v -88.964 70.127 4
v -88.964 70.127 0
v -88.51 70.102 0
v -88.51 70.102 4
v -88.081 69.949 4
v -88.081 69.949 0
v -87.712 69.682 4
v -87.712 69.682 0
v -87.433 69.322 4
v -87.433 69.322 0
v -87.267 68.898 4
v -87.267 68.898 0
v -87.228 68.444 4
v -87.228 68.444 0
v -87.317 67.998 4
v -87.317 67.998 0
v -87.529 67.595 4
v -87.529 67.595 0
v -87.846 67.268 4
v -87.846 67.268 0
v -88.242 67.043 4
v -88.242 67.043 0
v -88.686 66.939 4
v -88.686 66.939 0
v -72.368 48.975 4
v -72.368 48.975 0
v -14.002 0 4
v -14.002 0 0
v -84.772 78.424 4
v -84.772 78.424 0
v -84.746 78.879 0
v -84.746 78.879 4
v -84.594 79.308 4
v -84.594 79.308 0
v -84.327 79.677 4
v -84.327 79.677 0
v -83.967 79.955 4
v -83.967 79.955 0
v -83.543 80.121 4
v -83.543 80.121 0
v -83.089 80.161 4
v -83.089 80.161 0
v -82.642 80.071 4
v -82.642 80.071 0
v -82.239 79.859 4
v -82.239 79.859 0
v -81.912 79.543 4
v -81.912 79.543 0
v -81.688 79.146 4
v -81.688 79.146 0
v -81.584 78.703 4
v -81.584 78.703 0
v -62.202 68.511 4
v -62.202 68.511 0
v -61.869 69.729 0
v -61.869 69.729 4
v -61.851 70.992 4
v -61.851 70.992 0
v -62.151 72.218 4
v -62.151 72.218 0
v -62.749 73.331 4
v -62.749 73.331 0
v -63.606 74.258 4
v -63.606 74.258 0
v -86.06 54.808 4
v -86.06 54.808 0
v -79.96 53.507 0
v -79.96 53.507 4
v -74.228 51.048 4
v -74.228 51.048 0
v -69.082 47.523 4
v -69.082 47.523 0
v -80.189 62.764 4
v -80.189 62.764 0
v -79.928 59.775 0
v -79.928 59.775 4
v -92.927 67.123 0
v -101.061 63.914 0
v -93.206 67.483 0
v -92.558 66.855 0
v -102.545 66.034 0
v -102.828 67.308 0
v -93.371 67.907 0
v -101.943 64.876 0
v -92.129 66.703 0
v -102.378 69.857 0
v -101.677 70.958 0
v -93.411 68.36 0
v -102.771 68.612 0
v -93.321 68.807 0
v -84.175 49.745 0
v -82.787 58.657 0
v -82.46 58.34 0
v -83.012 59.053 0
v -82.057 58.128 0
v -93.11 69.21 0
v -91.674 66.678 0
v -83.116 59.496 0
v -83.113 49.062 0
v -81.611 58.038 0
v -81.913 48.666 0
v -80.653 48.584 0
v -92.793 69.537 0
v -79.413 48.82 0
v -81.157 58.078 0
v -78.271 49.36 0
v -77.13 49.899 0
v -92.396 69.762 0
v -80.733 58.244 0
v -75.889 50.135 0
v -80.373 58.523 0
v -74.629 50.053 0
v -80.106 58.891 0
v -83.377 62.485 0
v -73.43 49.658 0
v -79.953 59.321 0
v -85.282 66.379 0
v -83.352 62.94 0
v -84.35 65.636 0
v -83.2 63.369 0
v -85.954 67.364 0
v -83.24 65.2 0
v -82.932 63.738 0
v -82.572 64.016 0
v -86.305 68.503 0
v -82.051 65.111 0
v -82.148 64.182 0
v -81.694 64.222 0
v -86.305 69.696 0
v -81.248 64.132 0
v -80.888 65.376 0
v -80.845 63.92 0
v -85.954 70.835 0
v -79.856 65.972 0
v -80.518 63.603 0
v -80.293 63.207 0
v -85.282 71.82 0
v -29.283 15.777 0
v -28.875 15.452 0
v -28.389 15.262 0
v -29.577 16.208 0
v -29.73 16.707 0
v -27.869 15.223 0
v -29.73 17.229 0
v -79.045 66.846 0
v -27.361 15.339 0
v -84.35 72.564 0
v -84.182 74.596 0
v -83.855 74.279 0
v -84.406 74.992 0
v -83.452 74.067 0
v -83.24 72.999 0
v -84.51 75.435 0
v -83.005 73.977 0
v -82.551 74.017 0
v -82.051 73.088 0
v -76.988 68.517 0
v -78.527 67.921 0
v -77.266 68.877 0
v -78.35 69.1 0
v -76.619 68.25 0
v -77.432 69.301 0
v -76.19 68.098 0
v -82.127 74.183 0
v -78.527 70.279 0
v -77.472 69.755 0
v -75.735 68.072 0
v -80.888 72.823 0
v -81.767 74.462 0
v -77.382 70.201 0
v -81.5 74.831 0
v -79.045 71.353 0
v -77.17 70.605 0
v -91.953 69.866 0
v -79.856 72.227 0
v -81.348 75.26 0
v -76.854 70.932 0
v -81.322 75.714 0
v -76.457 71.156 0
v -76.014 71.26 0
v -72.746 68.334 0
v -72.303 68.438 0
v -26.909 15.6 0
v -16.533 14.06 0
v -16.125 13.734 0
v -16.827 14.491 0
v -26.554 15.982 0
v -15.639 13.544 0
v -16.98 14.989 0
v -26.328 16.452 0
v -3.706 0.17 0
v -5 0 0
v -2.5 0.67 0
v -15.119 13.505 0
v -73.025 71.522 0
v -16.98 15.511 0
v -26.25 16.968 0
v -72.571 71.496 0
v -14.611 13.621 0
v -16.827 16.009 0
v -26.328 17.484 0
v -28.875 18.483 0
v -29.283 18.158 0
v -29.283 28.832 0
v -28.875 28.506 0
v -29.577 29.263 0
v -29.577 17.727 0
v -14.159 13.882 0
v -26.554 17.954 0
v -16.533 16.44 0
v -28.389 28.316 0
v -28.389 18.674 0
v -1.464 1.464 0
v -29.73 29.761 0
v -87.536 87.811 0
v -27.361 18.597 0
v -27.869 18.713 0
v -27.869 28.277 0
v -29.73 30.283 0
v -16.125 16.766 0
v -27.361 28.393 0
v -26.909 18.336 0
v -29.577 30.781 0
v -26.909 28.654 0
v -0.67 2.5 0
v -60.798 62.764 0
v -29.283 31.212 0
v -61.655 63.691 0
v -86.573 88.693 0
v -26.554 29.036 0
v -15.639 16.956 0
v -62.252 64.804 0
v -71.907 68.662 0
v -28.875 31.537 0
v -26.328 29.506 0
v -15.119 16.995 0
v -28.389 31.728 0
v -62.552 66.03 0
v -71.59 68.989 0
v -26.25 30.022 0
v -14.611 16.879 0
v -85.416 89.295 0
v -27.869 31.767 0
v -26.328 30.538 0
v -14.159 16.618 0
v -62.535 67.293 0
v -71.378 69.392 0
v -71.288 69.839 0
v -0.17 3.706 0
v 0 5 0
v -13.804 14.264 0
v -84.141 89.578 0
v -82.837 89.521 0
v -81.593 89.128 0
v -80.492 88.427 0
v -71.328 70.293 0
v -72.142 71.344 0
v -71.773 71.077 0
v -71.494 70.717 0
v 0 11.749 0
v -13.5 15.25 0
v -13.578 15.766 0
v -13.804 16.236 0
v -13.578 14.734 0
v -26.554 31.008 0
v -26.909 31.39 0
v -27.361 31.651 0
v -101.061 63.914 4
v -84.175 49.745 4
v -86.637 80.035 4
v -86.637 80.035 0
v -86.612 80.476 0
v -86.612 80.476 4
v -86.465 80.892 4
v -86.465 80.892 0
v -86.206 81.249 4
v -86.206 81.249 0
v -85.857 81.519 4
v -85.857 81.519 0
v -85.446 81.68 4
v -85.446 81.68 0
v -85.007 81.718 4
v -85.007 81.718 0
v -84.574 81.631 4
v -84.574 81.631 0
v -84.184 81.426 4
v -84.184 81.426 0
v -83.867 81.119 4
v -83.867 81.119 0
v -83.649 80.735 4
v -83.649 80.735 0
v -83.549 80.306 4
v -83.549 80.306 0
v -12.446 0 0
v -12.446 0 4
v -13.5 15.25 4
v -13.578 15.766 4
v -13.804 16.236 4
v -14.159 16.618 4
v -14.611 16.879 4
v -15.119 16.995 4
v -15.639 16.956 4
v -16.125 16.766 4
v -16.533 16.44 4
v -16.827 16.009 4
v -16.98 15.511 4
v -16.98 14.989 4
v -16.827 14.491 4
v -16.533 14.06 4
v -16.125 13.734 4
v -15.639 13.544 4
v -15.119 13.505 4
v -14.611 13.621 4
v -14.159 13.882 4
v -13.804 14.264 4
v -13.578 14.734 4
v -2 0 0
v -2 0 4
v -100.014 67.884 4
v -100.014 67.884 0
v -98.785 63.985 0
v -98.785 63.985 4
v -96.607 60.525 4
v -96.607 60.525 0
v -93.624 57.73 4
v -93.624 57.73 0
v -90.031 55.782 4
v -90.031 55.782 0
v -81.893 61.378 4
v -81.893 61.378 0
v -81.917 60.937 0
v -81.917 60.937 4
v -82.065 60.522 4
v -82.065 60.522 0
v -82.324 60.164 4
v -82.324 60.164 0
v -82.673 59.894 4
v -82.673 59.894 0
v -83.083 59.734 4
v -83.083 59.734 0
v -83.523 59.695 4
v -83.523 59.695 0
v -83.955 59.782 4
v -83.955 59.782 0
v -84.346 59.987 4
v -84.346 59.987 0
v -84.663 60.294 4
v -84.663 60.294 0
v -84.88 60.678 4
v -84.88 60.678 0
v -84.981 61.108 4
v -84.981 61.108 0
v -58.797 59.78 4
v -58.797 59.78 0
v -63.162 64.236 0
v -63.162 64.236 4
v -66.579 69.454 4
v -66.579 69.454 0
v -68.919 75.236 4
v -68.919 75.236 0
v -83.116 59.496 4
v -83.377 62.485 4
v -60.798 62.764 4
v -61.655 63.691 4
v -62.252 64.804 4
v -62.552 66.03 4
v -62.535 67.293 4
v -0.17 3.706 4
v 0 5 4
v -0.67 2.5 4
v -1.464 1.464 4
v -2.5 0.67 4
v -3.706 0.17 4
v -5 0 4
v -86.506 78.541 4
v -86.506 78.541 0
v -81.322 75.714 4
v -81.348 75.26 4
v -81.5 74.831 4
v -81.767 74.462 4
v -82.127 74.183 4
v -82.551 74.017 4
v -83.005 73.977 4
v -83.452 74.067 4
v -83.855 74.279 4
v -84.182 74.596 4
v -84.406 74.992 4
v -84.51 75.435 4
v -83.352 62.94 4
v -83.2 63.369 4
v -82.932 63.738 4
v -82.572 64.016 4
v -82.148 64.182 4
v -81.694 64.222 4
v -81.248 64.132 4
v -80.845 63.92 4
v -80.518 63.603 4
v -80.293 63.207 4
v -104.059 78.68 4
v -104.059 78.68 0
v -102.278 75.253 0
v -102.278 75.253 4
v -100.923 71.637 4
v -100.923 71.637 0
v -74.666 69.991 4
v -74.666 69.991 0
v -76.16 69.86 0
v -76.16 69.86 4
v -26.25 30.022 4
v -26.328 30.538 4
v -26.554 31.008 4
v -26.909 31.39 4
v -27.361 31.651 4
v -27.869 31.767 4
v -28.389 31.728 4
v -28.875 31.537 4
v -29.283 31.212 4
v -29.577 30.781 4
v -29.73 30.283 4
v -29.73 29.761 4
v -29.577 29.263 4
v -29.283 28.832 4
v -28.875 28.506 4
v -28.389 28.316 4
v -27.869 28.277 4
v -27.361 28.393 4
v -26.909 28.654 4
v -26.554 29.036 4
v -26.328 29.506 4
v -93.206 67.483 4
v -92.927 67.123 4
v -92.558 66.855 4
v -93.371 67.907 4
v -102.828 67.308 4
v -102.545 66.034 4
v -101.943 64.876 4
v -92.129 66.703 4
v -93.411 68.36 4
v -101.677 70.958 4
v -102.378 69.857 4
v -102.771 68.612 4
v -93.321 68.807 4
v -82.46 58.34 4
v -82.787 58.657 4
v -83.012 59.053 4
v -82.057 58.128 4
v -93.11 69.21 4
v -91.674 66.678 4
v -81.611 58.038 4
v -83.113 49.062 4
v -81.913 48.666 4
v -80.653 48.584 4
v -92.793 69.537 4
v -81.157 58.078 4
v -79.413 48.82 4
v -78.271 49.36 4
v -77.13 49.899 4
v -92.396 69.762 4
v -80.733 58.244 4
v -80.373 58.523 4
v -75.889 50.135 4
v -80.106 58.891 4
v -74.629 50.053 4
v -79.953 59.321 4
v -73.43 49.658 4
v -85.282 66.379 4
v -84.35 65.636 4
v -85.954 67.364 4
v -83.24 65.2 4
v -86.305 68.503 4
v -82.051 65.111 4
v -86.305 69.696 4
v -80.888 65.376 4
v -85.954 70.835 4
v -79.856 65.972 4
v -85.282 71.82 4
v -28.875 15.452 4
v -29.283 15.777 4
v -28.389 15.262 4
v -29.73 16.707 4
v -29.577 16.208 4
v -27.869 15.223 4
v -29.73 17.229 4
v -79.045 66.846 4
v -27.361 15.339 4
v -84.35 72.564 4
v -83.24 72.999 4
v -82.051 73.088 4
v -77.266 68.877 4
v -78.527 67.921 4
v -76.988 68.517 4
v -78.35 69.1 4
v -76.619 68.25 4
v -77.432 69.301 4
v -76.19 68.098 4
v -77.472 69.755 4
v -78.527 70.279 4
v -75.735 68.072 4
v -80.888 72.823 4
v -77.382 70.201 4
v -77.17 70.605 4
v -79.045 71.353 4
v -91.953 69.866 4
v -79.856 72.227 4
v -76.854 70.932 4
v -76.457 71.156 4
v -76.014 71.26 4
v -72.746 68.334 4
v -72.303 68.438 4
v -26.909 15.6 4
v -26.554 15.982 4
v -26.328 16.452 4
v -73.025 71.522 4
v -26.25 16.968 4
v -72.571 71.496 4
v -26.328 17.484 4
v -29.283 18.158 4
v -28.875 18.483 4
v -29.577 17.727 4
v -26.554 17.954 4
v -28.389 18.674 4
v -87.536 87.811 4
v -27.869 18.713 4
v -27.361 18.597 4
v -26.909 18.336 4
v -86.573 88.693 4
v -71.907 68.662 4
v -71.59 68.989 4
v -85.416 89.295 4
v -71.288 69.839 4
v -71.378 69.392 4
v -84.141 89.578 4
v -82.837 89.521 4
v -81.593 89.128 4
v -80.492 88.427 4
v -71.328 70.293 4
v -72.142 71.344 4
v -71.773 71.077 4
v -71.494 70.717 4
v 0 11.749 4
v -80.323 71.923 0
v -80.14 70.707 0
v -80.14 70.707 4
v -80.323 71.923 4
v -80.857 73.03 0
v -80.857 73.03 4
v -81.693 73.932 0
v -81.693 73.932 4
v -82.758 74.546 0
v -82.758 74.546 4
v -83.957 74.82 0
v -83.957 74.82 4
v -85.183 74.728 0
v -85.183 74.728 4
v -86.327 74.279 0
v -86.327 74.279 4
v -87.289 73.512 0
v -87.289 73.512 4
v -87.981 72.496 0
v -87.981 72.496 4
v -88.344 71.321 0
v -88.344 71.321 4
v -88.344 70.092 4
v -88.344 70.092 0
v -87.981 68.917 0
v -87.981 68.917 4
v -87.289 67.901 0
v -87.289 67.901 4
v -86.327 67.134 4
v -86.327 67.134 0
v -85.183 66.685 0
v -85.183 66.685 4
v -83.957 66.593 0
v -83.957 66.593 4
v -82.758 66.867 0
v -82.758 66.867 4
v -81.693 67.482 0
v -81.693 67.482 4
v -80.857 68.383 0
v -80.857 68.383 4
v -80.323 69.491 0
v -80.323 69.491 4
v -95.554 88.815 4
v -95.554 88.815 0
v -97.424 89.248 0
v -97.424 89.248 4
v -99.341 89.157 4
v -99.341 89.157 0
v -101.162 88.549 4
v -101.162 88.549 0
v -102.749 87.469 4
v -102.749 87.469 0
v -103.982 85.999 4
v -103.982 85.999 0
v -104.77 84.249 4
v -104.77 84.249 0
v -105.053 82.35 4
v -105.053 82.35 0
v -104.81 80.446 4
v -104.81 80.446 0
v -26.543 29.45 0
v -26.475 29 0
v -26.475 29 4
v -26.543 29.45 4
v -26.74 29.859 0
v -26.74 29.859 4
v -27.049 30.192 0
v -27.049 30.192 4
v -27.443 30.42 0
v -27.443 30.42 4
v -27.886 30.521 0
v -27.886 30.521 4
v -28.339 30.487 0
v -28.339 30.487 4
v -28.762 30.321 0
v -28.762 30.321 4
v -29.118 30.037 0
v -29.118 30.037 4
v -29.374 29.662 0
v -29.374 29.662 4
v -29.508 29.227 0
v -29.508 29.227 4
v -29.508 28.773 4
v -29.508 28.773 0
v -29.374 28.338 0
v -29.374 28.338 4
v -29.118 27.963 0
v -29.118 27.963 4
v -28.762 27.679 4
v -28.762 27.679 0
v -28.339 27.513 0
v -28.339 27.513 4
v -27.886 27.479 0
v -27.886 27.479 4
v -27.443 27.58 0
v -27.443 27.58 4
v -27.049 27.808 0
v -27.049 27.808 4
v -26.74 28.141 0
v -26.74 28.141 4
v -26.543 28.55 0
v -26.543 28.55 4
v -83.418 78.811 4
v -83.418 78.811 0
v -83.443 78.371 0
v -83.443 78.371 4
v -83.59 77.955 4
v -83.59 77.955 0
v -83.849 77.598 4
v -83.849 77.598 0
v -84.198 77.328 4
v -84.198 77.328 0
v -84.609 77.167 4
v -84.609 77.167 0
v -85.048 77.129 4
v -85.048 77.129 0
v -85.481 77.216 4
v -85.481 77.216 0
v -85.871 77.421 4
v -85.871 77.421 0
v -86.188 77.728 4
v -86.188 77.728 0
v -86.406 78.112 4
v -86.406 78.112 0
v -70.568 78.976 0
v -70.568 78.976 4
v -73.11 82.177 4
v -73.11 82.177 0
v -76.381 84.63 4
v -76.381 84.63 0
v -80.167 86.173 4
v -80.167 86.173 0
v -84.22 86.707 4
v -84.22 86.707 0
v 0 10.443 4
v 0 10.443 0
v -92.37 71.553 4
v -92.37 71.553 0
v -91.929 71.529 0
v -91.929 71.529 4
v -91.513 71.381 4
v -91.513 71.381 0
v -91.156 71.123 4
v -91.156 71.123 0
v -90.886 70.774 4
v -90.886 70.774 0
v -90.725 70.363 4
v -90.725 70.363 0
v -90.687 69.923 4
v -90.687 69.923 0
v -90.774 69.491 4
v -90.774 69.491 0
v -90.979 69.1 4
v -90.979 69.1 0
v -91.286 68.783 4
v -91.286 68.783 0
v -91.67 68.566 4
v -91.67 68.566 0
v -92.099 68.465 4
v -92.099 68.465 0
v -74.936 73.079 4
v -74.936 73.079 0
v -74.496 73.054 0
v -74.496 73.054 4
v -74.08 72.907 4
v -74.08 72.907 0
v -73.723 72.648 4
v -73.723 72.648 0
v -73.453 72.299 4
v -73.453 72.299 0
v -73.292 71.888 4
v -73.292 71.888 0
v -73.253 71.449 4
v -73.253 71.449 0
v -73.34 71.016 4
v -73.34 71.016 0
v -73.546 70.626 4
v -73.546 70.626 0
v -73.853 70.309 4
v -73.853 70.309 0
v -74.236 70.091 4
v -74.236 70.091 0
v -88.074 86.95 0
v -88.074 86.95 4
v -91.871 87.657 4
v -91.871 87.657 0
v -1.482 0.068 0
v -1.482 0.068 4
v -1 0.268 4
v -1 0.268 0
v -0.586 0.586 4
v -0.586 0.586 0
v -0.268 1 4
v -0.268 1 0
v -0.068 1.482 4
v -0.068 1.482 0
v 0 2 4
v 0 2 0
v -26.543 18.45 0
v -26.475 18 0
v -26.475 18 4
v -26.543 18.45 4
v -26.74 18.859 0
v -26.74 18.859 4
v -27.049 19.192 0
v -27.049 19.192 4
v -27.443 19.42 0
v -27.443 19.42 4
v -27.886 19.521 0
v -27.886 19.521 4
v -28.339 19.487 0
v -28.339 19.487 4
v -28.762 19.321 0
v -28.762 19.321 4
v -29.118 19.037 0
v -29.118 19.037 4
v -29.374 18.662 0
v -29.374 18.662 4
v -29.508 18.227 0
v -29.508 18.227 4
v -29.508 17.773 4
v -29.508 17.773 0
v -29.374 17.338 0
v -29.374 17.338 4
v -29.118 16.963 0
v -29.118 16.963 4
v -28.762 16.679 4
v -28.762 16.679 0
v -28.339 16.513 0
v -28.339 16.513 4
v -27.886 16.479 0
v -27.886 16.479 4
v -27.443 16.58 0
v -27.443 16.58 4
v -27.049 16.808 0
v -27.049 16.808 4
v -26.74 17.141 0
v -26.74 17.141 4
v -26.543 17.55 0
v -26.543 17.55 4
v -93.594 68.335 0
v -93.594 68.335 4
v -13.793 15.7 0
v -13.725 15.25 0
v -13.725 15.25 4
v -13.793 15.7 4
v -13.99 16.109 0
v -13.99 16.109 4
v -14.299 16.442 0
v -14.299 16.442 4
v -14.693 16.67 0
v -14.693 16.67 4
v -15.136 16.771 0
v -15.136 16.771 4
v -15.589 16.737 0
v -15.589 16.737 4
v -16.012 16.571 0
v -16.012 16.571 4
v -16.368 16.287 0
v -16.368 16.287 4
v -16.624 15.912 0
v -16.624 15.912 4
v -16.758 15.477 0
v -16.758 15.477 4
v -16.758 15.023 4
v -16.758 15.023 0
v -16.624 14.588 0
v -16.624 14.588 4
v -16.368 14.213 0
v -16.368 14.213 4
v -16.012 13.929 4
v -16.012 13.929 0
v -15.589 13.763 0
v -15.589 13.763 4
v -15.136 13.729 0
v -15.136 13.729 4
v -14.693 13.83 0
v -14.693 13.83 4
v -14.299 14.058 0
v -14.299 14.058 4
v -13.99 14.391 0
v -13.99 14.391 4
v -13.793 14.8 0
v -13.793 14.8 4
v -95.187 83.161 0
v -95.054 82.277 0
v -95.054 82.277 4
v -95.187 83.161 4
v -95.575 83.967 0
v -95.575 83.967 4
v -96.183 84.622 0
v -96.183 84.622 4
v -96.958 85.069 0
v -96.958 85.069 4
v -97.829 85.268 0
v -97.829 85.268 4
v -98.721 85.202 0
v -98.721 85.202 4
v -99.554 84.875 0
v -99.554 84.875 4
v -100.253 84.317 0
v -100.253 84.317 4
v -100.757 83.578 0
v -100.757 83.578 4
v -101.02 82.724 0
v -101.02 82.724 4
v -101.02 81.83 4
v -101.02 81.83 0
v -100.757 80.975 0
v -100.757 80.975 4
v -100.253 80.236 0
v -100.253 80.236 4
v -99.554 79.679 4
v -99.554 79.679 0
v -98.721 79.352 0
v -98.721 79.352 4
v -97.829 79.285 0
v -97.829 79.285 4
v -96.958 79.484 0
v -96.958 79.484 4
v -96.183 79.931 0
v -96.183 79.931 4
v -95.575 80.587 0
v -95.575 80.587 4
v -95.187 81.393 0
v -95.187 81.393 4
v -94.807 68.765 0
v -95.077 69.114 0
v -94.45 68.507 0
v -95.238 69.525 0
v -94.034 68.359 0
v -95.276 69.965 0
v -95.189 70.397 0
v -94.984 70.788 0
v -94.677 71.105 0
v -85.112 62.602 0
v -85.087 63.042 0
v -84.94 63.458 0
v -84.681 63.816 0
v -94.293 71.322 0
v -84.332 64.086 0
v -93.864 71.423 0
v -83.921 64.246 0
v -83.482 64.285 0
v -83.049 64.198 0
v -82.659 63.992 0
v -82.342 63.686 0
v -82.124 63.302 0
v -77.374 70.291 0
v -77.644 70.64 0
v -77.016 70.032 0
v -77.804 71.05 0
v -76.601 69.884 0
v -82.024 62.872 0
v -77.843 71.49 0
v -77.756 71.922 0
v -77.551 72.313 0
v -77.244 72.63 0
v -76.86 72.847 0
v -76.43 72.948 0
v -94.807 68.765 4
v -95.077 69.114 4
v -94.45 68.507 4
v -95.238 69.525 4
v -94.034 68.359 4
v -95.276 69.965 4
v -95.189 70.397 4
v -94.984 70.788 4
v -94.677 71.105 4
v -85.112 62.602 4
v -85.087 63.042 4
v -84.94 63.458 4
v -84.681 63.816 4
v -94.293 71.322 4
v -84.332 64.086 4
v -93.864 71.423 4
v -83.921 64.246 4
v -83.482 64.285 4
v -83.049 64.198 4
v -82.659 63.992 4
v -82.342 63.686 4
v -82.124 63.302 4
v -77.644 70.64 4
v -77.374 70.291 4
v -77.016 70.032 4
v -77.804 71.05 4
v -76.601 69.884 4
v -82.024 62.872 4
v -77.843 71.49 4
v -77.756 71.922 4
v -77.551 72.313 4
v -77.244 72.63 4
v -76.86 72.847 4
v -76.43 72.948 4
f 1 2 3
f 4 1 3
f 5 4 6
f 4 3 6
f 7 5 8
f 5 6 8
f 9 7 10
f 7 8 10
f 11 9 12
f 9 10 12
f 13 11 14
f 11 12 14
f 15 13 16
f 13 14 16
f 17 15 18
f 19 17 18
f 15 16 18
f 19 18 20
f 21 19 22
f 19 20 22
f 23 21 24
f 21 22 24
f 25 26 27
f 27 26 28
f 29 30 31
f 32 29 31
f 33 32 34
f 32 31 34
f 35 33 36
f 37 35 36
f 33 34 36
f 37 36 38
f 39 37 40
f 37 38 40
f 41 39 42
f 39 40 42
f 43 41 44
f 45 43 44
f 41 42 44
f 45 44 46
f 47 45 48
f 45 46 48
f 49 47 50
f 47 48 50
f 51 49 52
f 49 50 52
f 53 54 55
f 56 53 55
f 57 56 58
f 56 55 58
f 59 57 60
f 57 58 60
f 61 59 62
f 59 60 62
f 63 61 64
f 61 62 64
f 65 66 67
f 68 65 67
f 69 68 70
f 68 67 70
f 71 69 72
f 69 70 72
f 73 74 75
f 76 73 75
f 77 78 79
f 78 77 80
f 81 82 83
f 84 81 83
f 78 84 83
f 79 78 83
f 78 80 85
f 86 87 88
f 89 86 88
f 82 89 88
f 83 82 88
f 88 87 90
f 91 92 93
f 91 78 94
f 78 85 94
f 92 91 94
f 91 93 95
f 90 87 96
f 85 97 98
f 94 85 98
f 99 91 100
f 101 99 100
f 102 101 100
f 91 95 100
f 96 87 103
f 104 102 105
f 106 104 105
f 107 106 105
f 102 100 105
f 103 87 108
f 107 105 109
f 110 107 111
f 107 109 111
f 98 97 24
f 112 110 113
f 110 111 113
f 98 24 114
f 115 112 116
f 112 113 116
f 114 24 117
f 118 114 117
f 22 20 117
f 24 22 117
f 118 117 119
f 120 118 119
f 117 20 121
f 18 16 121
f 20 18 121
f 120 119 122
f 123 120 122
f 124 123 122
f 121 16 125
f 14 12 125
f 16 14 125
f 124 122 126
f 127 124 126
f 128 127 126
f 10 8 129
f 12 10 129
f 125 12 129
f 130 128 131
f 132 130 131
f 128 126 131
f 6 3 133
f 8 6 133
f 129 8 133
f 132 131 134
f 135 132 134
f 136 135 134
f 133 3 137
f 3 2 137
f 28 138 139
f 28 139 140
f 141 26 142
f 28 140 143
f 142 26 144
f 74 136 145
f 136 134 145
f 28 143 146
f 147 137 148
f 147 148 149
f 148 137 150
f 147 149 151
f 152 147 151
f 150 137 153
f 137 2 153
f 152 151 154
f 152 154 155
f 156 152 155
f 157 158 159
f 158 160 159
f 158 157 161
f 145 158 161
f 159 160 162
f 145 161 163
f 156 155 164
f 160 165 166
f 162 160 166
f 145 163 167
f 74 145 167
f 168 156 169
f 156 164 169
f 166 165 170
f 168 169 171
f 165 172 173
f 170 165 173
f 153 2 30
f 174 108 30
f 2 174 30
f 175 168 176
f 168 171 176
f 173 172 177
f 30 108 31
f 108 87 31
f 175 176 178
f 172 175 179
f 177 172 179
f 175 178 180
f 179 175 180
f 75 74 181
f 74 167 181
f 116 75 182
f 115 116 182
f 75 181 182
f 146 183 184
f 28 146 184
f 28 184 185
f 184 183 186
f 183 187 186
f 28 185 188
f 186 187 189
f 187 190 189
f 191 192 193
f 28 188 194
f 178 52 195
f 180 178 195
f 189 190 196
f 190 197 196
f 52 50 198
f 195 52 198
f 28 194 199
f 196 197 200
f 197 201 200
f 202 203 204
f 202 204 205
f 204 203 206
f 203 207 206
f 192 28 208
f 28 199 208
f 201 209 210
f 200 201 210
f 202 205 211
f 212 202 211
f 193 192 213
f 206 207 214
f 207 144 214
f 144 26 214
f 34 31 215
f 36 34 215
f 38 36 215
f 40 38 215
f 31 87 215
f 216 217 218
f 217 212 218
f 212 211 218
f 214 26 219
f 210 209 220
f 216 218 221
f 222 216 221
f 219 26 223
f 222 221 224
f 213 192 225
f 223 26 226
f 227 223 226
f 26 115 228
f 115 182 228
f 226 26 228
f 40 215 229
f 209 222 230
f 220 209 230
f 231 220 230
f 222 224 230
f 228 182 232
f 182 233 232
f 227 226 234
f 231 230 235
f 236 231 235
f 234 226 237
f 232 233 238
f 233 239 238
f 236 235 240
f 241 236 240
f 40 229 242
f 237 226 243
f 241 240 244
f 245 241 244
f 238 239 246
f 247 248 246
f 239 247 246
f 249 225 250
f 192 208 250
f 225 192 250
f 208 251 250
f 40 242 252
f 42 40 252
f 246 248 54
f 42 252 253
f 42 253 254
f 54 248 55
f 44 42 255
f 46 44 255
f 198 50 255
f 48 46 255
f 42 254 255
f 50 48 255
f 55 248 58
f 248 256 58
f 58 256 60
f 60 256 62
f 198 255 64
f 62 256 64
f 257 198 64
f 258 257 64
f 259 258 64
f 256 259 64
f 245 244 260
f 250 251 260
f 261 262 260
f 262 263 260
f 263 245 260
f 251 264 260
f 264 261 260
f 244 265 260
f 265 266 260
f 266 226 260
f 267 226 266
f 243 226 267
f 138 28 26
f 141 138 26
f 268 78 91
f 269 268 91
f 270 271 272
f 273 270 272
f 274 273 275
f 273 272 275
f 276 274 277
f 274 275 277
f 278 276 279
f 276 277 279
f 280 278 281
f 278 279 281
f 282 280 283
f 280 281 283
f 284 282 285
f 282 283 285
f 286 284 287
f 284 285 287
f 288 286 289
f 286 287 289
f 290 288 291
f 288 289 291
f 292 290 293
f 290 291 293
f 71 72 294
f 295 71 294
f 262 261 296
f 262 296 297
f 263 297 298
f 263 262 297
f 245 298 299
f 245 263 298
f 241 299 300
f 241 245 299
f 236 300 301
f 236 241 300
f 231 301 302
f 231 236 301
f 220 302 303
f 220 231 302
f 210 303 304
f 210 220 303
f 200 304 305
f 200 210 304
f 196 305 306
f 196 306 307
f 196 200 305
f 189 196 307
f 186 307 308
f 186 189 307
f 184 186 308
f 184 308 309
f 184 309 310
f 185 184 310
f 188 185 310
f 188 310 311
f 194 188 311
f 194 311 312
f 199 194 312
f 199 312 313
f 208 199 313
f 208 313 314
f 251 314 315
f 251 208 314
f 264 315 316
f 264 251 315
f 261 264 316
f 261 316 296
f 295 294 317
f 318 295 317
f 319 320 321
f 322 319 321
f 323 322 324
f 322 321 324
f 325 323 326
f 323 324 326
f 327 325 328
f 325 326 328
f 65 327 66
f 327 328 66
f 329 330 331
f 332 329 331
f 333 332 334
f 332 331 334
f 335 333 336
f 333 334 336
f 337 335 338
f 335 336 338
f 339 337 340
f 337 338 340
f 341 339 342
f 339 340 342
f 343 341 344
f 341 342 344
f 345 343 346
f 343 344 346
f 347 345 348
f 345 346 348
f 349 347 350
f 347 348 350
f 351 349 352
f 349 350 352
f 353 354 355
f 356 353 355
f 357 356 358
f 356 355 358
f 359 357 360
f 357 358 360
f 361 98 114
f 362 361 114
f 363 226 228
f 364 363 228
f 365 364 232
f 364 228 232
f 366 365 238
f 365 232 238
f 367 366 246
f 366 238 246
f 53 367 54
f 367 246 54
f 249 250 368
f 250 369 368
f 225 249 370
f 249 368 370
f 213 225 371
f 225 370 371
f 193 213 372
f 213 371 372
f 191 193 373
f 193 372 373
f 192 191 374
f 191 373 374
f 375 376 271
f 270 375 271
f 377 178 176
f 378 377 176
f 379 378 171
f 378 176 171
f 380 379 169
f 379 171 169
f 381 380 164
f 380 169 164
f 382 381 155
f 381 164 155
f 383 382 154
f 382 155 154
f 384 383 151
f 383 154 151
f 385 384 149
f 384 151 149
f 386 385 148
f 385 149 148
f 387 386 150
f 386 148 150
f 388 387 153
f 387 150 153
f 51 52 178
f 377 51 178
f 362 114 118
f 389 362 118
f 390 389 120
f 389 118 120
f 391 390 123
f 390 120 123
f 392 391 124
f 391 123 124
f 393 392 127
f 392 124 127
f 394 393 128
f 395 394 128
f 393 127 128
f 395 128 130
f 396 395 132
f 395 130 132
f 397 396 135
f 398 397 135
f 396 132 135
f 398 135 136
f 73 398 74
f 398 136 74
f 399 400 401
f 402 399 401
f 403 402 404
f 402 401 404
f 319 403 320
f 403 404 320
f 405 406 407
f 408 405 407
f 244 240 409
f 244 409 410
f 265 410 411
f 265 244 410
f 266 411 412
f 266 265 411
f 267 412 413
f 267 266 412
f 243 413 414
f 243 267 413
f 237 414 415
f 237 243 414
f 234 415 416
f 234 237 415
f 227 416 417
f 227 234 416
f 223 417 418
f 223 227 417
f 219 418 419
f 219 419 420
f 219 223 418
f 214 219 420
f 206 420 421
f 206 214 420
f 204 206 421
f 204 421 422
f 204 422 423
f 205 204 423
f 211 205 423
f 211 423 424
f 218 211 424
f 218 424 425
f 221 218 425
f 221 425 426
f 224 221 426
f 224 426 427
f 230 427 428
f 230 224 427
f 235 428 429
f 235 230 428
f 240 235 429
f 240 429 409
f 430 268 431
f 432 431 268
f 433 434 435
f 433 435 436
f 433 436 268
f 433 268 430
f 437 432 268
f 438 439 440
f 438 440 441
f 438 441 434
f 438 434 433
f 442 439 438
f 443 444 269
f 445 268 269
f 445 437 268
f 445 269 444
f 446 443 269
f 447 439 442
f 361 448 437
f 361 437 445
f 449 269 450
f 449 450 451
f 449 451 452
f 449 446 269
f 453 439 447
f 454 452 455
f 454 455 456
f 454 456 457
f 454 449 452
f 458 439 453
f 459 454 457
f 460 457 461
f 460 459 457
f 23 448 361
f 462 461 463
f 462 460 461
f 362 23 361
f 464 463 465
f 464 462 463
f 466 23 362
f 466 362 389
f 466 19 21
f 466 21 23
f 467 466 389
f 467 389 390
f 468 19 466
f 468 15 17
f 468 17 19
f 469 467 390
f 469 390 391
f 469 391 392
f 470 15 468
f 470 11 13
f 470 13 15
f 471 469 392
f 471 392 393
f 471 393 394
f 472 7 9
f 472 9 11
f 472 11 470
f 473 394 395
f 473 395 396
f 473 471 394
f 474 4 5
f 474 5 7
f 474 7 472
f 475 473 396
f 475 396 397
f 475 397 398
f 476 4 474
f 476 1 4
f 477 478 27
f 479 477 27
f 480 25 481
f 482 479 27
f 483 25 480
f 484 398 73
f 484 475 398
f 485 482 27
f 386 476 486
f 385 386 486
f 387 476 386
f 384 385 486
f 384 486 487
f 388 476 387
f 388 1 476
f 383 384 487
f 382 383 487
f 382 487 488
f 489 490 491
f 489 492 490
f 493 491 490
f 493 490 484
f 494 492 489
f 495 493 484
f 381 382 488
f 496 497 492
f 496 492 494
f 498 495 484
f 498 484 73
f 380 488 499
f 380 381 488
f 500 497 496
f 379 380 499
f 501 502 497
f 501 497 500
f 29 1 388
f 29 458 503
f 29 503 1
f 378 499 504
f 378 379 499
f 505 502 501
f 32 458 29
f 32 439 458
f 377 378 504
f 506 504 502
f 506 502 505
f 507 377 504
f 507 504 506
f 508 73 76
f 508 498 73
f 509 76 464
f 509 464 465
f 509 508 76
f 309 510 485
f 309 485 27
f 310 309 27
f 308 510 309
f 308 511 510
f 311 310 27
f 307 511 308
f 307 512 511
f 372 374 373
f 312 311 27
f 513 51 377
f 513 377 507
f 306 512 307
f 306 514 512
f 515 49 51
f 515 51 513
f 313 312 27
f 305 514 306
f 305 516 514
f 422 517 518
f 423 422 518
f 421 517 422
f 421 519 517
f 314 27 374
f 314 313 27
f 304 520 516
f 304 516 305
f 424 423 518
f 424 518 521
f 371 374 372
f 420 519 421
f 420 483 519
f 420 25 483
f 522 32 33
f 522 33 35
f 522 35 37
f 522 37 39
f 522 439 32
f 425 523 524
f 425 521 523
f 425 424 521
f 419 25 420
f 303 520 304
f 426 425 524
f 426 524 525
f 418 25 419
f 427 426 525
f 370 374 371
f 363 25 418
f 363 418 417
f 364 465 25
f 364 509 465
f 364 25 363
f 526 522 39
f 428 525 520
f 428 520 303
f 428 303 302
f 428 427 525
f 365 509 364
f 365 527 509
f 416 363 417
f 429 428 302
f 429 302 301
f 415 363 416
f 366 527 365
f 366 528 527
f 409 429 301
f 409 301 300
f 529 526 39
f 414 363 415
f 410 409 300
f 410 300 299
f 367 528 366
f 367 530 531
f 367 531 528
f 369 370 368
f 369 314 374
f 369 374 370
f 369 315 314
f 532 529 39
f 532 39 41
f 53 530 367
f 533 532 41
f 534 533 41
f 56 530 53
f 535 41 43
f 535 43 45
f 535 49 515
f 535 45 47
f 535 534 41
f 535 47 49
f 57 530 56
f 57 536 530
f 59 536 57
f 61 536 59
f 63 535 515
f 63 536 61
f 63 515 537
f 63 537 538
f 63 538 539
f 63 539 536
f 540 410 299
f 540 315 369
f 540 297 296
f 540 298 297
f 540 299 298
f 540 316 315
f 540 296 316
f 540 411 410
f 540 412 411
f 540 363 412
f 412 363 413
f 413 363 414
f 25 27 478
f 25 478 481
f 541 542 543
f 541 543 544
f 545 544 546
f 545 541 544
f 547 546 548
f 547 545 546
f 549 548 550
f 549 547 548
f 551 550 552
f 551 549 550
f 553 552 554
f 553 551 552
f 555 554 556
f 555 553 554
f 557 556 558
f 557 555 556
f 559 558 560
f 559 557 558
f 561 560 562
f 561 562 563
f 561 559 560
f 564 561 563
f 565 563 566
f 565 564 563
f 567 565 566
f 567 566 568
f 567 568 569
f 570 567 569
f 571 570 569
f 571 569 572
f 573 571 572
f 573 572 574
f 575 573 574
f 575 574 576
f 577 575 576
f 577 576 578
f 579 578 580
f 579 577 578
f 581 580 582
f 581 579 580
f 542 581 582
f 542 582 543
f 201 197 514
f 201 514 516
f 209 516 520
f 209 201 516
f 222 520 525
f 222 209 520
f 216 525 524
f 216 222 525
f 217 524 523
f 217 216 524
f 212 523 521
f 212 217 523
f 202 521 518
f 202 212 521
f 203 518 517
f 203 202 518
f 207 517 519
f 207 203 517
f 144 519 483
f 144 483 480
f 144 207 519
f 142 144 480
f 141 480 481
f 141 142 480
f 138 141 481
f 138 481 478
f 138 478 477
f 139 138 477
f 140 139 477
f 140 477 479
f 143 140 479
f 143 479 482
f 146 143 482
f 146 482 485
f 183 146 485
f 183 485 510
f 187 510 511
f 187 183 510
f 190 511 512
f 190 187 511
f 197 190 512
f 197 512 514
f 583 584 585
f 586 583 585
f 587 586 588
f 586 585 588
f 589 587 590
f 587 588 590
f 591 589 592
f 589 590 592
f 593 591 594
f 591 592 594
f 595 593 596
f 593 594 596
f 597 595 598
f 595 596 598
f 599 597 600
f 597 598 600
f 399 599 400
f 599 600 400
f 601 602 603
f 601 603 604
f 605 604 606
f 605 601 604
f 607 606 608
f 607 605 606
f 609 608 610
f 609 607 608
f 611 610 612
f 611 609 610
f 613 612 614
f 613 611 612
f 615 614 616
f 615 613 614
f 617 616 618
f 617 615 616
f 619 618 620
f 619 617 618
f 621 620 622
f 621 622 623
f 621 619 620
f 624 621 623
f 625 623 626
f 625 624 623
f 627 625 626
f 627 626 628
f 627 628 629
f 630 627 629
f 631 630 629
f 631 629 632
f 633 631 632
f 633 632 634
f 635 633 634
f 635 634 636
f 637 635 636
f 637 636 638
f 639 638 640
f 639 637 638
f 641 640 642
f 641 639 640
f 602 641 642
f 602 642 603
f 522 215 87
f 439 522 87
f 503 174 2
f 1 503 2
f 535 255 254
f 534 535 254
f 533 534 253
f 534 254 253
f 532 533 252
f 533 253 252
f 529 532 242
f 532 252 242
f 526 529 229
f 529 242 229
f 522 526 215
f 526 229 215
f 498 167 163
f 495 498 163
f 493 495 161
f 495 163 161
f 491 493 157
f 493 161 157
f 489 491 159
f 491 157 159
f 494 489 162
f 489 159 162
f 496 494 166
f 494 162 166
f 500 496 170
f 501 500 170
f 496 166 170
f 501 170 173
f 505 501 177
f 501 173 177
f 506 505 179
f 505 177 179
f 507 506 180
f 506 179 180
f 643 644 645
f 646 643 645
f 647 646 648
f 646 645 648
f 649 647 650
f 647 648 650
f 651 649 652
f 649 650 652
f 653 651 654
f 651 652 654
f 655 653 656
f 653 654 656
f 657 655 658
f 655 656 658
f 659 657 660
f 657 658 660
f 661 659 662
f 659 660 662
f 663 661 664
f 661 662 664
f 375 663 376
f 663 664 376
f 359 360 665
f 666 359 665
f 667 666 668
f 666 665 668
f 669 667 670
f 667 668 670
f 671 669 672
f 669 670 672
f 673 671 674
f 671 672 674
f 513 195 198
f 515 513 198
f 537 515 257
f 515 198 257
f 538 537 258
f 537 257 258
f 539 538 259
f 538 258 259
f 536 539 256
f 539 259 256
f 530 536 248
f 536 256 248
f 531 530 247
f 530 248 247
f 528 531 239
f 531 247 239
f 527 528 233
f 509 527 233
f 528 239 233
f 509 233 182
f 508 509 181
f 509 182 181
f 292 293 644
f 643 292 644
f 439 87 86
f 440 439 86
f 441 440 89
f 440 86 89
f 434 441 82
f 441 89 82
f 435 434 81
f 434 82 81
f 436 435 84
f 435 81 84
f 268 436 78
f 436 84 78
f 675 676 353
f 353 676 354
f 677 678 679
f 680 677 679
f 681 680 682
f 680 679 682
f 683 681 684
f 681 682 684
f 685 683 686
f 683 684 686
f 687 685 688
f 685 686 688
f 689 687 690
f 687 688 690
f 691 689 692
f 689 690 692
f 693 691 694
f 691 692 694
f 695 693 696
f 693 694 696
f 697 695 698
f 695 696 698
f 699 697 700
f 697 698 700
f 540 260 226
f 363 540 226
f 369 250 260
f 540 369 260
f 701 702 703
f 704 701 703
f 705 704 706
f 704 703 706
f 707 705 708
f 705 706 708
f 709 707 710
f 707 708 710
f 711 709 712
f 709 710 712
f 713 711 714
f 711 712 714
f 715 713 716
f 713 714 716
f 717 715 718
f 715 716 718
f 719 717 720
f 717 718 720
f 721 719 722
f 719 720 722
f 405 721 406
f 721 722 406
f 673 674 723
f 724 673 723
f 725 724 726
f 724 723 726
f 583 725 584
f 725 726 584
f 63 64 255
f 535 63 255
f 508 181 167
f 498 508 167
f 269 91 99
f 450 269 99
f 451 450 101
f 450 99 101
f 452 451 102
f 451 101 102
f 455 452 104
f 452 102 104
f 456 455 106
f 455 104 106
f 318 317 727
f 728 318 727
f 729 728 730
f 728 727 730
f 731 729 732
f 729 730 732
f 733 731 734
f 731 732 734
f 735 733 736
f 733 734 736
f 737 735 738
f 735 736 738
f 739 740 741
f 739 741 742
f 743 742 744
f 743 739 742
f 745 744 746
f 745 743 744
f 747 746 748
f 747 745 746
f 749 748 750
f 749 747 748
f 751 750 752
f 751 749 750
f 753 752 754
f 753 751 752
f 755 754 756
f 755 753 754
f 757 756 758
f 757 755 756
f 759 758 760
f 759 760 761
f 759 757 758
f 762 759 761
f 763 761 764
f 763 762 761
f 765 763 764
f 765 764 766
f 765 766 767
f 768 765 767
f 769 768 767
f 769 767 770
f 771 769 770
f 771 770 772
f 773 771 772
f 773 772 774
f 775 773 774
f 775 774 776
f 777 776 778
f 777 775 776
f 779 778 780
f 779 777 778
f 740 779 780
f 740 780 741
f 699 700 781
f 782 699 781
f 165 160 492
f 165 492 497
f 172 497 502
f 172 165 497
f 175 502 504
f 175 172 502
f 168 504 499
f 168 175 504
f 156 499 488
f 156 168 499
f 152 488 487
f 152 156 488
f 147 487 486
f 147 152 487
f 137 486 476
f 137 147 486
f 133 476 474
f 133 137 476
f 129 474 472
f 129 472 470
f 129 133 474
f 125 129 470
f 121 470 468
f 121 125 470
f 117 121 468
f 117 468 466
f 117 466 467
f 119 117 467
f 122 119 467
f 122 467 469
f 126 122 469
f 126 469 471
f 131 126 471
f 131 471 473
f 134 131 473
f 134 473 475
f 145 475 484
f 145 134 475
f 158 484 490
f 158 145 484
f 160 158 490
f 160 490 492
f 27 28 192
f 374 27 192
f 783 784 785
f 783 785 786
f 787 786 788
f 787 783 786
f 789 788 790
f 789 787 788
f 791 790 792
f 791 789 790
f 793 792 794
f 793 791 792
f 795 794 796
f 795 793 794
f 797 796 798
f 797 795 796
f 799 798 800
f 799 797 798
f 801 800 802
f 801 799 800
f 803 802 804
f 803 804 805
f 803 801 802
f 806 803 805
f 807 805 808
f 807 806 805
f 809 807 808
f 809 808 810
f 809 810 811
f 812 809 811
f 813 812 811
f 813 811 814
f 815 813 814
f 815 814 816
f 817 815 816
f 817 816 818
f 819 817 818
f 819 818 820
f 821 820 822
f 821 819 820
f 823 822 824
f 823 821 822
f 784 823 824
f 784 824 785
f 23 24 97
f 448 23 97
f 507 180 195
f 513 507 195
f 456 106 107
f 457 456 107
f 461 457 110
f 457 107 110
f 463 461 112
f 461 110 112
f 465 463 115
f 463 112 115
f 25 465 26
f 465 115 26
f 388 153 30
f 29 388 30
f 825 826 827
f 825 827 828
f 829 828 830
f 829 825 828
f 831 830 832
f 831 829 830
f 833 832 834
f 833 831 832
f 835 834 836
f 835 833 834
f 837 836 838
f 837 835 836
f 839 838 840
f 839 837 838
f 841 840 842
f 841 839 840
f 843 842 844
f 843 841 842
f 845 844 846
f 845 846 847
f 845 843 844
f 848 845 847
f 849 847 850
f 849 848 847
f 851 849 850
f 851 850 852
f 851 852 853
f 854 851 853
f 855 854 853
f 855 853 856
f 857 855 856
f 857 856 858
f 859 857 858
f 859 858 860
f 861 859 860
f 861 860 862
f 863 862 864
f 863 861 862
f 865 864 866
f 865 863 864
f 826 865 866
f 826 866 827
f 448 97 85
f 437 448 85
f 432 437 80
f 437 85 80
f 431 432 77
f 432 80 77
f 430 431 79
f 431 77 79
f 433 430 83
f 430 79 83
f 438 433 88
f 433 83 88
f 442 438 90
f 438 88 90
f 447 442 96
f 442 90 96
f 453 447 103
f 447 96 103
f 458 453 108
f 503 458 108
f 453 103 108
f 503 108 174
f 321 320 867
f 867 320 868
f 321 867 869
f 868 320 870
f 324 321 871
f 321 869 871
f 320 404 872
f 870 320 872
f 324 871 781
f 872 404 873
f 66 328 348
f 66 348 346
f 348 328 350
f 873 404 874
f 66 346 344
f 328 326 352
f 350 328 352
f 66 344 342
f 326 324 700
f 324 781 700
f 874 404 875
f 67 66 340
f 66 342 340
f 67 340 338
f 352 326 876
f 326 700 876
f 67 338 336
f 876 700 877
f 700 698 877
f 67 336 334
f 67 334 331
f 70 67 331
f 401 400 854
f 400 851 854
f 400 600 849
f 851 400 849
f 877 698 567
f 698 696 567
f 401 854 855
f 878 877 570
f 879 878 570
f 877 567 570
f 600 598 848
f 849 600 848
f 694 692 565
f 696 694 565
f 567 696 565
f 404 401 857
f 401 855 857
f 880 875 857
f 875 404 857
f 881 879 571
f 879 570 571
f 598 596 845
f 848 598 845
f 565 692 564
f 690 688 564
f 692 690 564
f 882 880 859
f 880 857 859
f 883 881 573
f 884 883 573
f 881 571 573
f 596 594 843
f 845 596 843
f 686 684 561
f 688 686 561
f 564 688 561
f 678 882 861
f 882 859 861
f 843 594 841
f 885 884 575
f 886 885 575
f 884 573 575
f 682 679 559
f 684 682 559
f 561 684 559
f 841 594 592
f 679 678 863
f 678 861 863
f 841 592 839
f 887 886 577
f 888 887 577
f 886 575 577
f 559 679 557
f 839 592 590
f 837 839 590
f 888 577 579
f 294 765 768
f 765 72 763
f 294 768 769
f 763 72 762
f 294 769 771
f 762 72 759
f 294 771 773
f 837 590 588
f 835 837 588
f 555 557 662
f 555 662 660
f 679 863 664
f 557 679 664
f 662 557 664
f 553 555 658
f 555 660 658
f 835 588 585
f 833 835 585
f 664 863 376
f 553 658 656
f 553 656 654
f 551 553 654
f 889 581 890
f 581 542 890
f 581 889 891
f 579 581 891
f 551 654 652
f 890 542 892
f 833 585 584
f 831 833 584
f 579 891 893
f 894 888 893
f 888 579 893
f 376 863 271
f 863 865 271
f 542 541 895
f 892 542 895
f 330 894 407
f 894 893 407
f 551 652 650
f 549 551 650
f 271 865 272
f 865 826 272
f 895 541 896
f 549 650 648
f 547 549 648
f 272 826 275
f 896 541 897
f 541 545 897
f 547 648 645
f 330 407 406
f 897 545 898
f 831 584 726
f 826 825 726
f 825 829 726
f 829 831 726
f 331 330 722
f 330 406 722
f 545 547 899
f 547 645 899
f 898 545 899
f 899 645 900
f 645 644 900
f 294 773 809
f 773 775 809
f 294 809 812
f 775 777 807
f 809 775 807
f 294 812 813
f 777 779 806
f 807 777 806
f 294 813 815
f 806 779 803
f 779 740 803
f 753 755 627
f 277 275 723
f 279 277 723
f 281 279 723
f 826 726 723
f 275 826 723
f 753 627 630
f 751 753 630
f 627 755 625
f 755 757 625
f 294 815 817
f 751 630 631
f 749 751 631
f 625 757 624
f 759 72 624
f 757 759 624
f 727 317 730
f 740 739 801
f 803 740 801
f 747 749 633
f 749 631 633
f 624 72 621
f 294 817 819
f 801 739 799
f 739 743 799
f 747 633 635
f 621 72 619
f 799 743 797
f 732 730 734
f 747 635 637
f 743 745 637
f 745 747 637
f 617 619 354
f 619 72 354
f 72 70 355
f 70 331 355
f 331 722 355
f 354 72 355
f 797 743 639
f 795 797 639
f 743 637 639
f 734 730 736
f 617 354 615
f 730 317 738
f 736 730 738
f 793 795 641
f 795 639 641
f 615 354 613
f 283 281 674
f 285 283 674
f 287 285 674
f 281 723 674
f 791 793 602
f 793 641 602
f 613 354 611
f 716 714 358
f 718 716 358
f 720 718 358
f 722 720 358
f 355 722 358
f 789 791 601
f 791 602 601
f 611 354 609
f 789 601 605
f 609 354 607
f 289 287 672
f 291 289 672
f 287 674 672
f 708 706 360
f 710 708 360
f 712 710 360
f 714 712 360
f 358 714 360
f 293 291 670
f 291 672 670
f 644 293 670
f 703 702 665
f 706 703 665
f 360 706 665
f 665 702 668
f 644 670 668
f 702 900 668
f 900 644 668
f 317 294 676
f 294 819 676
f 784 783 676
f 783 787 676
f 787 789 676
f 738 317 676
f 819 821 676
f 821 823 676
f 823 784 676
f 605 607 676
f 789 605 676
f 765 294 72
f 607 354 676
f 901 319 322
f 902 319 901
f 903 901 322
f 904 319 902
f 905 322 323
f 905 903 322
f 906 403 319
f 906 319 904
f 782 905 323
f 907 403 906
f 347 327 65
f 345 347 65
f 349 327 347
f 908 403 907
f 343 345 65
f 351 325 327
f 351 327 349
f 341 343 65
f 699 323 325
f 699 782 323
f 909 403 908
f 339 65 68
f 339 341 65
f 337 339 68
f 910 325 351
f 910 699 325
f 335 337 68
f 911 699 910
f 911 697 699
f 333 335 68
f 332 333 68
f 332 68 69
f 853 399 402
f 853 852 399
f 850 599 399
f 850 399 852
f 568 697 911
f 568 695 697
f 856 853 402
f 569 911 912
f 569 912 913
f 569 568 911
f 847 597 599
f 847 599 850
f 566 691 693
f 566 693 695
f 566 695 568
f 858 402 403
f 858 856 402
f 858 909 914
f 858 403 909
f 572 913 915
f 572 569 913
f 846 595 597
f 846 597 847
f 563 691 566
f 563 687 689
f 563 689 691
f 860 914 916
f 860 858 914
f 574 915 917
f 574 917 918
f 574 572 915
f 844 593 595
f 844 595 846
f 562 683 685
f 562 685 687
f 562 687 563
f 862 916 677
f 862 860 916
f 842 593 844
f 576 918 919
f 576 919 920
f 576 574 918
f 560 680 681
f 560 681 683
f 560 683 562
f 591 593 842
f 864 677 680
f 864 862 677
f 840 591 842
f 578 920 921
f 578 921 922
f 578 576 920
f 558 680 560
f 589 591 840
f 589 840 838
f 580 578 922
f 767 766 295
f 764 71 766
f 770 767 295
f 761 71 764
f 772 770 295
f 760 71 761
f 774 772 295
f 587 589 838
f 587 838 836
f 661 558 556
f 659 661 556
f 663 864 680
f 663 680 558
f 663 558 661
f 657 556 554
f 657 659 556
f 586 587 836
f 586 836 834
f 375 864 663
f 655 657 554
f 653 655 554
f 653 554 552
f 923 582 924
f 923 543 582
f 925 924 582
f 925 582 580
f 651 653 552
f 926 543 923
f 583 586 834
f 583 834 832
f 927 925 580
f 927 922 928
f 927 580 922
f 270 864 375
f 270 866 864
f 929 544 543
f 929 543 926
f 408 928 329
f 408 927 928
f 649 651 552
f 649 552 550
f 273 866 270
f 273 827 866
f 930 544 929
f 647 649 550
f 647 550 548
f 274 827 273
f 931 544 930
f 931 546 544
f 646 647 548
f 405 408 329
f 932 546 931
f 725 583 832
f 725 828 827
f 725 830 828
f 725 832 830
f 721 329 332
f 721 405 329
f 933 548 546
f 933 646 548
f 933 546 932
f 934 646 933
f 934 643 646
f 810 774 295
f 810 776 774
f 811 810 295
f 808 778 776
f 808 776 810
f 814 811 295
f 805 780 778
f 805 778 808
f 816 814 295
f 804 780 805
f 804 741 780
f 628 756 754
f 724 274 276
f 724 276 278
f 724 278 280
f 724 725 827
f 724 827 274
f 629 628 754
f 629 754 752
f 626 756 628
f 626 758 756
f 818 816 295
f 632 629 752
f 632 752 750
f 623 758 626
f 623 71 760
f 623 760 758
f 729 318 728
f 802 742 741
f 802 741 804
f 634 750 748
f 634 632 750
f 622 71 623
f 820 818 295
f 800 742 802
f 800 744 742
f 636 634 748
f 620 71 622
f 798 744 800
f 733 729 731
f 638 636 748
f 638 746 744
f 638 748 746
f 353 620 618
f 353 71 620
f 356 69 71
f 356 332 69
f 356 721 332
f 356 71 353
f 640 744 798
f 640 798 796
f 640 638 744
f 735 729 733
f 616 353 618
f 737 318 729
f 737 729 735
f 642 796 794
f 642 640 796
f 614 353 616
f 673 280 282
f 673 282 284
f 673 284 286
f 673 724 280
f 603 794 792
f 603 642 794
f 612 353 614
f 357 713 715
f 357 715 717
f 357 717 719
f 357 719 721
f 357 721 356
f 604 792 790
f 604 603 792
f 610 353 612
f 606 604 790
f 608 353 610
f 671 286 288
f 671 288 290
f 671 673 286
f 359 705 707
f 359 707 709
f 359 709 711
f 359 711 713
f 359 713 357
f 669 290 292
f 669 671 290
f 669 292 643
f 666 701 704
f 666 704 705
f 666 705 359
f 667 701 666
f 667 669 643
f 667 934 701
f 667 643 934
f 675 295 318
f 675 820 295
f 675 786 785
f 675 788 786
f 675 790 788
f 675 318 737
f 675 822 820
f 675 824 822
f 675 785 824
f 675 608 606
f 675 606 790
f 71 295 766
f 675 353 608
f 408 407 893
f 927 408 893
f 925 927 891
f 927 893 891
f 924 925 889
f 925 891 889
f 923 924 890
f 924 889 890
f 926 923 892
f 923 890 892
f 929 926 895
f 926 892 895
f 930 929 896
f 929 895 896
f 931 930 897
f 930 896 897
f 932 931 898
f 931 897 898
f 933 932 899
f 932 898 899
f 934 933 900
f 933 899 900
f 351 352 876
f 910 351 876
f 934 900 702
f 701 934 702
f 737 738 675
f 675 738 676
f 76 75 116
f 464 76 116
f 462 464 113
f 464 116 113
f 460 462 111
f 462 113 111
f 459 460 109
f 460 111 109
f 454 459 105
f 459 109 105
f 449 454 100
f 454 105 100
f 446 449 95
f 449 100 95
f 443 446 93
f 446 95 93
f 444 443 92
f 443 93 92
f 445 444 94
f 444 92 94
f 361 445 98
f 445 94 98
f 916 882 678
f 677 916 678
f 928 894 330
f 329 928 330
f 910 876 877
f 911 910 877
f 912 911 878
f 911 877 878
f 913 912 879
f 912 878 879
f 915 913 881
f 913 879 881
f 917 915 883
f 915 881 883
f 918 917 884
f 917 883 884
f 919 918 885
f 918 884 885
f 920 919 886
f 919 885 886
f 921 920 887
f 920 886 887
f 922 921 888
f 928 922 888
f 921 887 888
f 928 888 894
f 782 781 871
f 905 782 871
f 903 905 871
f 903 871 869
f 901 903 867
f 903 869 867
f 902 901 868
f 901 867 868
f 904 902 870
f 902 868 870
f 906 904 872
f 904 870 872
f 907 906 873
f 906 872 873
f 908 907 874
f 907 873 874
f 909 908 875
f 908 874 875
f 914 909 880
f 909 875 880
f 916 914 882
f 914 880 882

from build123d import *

# Parameters (mm, degrees)
F0_R     = 1.75
F0_R_2   = 4
F1_DEPTH = 4
F2_R     = 5
F3_R     = 1.525
F3_R_2   = 4.125
F3_R_3   = 3
F4_DEPTH = 4


with BuildPart() as f1:
    # F0 (on Top) → F1 (new body)
    with BuildSketch(Plane.XY):
        with BuildLine():
            Line((0, 11.748666), (-60.797521, 62.763843))
            ThreePointArc((-60.797521, 62.763843), (-62.440733, 65.407433), (-62.201564, 68.5109))
            ThreePointArc((-62.201564, 68.5109), (-61.962395, 71.614368), (-63.605606, 74.257957))
            Line((-63.605606, 74.257957), (-80.491665, 88.427043))
            ThreePointArc((-80.491665, 88.427043), (-84.141382, 89.577794), (-87.535825, 87.810759))
            Line((-87.535825, 87.810759), (-101.677152, 70.957781))
            ThreePointArc((-101.677152, 70.957781), (-102.827904, 67.308064), (-101.060868, 63.913621))
            Line((-101.060868, 63.913621), (-84.17481, 49.744535))
            ThreePointArc((-84.17481, 49.744535), (-81.286042, 48.585342), (-78.271254, 49.359789))
            ThreePointArc((-78.271254, 49.359789), (-75.256467, 50.134236), (-72.367698, 48.975043))
            Line((-72.367698, 48.975043), (-14.001514, 0))
            Line((-14.001514, 0), (0, 0))
            Line((0, 0), (0, 11.748666))
        make_face()
        with Locations((-28, 16.967753)):
            Circle(F0_R, mode=Mode.SUBTRACT)
        with Locations((-15.25, 15.25)):
            Circle(F0_R, mode=Mode.SUBTRACT)
        with Locations((-28, 30.021826)):
            Circle(F0_R, mode=Mode.SUBTRACT)
        with BuildLine():
            ThreePointArc((-79.927887, 59.775268), (-81.382349, 58.041907), (-83.11571, 59.496369))
            Line((-83.11571, 59.496369), (-83.377177, 62.484953))
            ThreePointArc((-83.377177, 62.484953), (-81.922714, 64.218314), (-80.189354, 62.763852))
            Line((-80.189354, 62.763852), (-79.927887, 59.775268))
        make_face(mode=Mode.SUBTRACT)
        with BuildLine():
            ThreePointArc((-91.674178, 66.677777), (-93.407539, 68.132239), (-91.953076, 69.8656))
            Line((-91.953076, 69.8656), (-88.964492, 70.127067))
            ThreePointArc((-88.964492, 70.127067), (-87.231132, 68.672605), (-88.685594, 66.939244))
            Line((-88.685594, 66.939244), (-91.674178, 66.677777))
        make_face(mode=Mode.SUBTRACT)
        with Locations((-82.349778, 69.099668)):
            Circle(F0_R_2, mode=Mode.SUBTRACT)
        with BuildLine():
            Line((-84.510201, 75.435484), (-84.771669, 78.424068))
            ThreePointArc((-84.771669, 78.424068), (-83.317206, 80.157429), (-81.583846, 78.702967))
            Line((-81.583846, 78.702967), (-81.322378, 75.714383))
            ThreePointArc((-81.322378, 75.714383), (-82.776841, 73.981022), (-84.510201, 75.435484))
        make_face(mode=Mode.SUBTRACT)
        with BuildLine():
            ThreePointArc((-73.025377, 71.521559), (-71.292016, 70.067097), (-72.746479, 68.333736))
            Line((-72.746479, 68.333736), (-75.735063, 68.072269))
            ThreePointArc((-75.735063, 68.072269), (-77.468424, 69.526731), (-76.013961, 71.260092))
            Line((-76.013961, 71.260092), (-73.025377, 71.521559))
        make_face(mode=Mode.SUBTRACT)
    extrude(amount=F1_DEPTH)

    # F2
    f2_edges = [f1.edges().sort_by_distance(p)[0] for p in [
        (0, 0, 2),
    ]]
    fillet(f2_edges, radius=F2_R)


with BuildPart() as f4:
    # F3 (on Top) → F4 (new body)
    with BuildSketch(Plane.XY):
        with BuildLine():
            ThreePointArc((-58.797132, 59.77991), (-64.997857, 66.761335), (-68.919235, 75.235535))
            ThreePointArc((-68.919235, 75.235535), (-74.667226, 83.50839), (-84.219773, 86.706573))
            ThreePointArc((-84.219773, 86.706573), (-89.982887, 87.246339), (-95.554483, 88.815466))
            ThreePointArc((-95.554483, 88.815466), (-103.416, 86.776327), (-104.059021, 78.680152))
            ThreePointArc((-104.059021, 78.680152), (-101.546236, 73.465677), (-100.013916, 67.883847))
            ThreePointArc((-100.013916, 67.883847), (-95.205538, 59.031784), (-86.060238, 54.807684))
            ThreePointArc((-86.060238, 54.807684), (-77.03384, 52.417409), (-69.081734, 47.523199))
            Line((-69.081734, 47.523199), (-12.445791, 0))
            Line((-12.445791, 0), (-2, 0))
            ThreePointArc((-2, 0), (-0.585786, 0.585786), (0, 2))
            Line((0, 2), (0, 10.443258))
            Line((0, 10.443258), (-58.797132, 59.77991))
        make_face()
        with Locations((-28, 18)):
            Circle(F3_R, mode=Mode.SUBTRACT)
        with Locations((-15.25, 15.25)):
            Circle(F3_R, mode=Mode.SUBTRACT)
        with Locations((-28, 29)):
            Circle(F3_R, mode=Mode.SUBTRACT)
        with BuildLine():
            ThreePointArc((-85.111745, 62.601988), (-83.702734, 64.281181), (-82.023541, 62.872171))
            Line((-82.023541, 62.872171), (-81.892807, 61.377879))
            ThreePointArc((-81.892807, 61.377879), (-83.301818, 59.698686), (-84.981011, 61.107696))
            Line((-84.981011, 61.107696), (-85.111745, 62.601988))
        make_face(mode=Mode.SUBTRACT)
        with BuildLine():
            ThreePointArc((-92.369538, 71.553493), (-90.690345, 70.144483), (-92.099355, 68.465289))
            Line((-92.099355, 68.465289), (-93.593647, 68.334556))
            ThreePointArc((-93.593647, 68.334556), (-95.27284, 69.743566), (-93.86383, 71.422759))
            Line((-93.86383, 71.422759), (-92.369538, 71.553493))
        make_face(mode=Mode.SUBTRACT)
        with Locations((-84.264889, 70.706637)):
            Circle(F3_R_2, mode=Mode.SUBTRACT)
        with Locations((-98.053689, 82.276814)):
            Circle(F3_R_3, mode=Mode.SUBTRACT)
        with BuildLine():
            ThreePointArc((-83.418033, 78.811286), (-84.827043, 77.132093), (-86.506236, 78.541103))
            Line((-86.506236, 78.541103), (-86.63697, 80.035395))
            ThreePointArc((-86.63697, 80.035395), (-85.22796, 81.714588), (-83.548767, 80.305578))
            Line((-83.548767, 80.305578), (-83.418033, 78.811286))
        make_face(mode=Mode.SUBTRACT)
        with BuildLine():
            Line((-74.665948, 69.990515), (-76.16024, 69.859781))
            ThreePointArc((-76.16024, 69.859781), (-77.839433, 71.268792), (-76.430423, 72.947985))
            Line((-76.430423, 72.947985), (-74.936131, 73.078718))
            ThreePointArc((-74.936131, 73.078718), (-73.256937, 71.669708), (-74.665948, 69.990515))
        make_face(mode=Mode.SUBTRACT)
    extrude(amount=F4_DEPTH)


solid = Compound([f1.part, f4.part])
